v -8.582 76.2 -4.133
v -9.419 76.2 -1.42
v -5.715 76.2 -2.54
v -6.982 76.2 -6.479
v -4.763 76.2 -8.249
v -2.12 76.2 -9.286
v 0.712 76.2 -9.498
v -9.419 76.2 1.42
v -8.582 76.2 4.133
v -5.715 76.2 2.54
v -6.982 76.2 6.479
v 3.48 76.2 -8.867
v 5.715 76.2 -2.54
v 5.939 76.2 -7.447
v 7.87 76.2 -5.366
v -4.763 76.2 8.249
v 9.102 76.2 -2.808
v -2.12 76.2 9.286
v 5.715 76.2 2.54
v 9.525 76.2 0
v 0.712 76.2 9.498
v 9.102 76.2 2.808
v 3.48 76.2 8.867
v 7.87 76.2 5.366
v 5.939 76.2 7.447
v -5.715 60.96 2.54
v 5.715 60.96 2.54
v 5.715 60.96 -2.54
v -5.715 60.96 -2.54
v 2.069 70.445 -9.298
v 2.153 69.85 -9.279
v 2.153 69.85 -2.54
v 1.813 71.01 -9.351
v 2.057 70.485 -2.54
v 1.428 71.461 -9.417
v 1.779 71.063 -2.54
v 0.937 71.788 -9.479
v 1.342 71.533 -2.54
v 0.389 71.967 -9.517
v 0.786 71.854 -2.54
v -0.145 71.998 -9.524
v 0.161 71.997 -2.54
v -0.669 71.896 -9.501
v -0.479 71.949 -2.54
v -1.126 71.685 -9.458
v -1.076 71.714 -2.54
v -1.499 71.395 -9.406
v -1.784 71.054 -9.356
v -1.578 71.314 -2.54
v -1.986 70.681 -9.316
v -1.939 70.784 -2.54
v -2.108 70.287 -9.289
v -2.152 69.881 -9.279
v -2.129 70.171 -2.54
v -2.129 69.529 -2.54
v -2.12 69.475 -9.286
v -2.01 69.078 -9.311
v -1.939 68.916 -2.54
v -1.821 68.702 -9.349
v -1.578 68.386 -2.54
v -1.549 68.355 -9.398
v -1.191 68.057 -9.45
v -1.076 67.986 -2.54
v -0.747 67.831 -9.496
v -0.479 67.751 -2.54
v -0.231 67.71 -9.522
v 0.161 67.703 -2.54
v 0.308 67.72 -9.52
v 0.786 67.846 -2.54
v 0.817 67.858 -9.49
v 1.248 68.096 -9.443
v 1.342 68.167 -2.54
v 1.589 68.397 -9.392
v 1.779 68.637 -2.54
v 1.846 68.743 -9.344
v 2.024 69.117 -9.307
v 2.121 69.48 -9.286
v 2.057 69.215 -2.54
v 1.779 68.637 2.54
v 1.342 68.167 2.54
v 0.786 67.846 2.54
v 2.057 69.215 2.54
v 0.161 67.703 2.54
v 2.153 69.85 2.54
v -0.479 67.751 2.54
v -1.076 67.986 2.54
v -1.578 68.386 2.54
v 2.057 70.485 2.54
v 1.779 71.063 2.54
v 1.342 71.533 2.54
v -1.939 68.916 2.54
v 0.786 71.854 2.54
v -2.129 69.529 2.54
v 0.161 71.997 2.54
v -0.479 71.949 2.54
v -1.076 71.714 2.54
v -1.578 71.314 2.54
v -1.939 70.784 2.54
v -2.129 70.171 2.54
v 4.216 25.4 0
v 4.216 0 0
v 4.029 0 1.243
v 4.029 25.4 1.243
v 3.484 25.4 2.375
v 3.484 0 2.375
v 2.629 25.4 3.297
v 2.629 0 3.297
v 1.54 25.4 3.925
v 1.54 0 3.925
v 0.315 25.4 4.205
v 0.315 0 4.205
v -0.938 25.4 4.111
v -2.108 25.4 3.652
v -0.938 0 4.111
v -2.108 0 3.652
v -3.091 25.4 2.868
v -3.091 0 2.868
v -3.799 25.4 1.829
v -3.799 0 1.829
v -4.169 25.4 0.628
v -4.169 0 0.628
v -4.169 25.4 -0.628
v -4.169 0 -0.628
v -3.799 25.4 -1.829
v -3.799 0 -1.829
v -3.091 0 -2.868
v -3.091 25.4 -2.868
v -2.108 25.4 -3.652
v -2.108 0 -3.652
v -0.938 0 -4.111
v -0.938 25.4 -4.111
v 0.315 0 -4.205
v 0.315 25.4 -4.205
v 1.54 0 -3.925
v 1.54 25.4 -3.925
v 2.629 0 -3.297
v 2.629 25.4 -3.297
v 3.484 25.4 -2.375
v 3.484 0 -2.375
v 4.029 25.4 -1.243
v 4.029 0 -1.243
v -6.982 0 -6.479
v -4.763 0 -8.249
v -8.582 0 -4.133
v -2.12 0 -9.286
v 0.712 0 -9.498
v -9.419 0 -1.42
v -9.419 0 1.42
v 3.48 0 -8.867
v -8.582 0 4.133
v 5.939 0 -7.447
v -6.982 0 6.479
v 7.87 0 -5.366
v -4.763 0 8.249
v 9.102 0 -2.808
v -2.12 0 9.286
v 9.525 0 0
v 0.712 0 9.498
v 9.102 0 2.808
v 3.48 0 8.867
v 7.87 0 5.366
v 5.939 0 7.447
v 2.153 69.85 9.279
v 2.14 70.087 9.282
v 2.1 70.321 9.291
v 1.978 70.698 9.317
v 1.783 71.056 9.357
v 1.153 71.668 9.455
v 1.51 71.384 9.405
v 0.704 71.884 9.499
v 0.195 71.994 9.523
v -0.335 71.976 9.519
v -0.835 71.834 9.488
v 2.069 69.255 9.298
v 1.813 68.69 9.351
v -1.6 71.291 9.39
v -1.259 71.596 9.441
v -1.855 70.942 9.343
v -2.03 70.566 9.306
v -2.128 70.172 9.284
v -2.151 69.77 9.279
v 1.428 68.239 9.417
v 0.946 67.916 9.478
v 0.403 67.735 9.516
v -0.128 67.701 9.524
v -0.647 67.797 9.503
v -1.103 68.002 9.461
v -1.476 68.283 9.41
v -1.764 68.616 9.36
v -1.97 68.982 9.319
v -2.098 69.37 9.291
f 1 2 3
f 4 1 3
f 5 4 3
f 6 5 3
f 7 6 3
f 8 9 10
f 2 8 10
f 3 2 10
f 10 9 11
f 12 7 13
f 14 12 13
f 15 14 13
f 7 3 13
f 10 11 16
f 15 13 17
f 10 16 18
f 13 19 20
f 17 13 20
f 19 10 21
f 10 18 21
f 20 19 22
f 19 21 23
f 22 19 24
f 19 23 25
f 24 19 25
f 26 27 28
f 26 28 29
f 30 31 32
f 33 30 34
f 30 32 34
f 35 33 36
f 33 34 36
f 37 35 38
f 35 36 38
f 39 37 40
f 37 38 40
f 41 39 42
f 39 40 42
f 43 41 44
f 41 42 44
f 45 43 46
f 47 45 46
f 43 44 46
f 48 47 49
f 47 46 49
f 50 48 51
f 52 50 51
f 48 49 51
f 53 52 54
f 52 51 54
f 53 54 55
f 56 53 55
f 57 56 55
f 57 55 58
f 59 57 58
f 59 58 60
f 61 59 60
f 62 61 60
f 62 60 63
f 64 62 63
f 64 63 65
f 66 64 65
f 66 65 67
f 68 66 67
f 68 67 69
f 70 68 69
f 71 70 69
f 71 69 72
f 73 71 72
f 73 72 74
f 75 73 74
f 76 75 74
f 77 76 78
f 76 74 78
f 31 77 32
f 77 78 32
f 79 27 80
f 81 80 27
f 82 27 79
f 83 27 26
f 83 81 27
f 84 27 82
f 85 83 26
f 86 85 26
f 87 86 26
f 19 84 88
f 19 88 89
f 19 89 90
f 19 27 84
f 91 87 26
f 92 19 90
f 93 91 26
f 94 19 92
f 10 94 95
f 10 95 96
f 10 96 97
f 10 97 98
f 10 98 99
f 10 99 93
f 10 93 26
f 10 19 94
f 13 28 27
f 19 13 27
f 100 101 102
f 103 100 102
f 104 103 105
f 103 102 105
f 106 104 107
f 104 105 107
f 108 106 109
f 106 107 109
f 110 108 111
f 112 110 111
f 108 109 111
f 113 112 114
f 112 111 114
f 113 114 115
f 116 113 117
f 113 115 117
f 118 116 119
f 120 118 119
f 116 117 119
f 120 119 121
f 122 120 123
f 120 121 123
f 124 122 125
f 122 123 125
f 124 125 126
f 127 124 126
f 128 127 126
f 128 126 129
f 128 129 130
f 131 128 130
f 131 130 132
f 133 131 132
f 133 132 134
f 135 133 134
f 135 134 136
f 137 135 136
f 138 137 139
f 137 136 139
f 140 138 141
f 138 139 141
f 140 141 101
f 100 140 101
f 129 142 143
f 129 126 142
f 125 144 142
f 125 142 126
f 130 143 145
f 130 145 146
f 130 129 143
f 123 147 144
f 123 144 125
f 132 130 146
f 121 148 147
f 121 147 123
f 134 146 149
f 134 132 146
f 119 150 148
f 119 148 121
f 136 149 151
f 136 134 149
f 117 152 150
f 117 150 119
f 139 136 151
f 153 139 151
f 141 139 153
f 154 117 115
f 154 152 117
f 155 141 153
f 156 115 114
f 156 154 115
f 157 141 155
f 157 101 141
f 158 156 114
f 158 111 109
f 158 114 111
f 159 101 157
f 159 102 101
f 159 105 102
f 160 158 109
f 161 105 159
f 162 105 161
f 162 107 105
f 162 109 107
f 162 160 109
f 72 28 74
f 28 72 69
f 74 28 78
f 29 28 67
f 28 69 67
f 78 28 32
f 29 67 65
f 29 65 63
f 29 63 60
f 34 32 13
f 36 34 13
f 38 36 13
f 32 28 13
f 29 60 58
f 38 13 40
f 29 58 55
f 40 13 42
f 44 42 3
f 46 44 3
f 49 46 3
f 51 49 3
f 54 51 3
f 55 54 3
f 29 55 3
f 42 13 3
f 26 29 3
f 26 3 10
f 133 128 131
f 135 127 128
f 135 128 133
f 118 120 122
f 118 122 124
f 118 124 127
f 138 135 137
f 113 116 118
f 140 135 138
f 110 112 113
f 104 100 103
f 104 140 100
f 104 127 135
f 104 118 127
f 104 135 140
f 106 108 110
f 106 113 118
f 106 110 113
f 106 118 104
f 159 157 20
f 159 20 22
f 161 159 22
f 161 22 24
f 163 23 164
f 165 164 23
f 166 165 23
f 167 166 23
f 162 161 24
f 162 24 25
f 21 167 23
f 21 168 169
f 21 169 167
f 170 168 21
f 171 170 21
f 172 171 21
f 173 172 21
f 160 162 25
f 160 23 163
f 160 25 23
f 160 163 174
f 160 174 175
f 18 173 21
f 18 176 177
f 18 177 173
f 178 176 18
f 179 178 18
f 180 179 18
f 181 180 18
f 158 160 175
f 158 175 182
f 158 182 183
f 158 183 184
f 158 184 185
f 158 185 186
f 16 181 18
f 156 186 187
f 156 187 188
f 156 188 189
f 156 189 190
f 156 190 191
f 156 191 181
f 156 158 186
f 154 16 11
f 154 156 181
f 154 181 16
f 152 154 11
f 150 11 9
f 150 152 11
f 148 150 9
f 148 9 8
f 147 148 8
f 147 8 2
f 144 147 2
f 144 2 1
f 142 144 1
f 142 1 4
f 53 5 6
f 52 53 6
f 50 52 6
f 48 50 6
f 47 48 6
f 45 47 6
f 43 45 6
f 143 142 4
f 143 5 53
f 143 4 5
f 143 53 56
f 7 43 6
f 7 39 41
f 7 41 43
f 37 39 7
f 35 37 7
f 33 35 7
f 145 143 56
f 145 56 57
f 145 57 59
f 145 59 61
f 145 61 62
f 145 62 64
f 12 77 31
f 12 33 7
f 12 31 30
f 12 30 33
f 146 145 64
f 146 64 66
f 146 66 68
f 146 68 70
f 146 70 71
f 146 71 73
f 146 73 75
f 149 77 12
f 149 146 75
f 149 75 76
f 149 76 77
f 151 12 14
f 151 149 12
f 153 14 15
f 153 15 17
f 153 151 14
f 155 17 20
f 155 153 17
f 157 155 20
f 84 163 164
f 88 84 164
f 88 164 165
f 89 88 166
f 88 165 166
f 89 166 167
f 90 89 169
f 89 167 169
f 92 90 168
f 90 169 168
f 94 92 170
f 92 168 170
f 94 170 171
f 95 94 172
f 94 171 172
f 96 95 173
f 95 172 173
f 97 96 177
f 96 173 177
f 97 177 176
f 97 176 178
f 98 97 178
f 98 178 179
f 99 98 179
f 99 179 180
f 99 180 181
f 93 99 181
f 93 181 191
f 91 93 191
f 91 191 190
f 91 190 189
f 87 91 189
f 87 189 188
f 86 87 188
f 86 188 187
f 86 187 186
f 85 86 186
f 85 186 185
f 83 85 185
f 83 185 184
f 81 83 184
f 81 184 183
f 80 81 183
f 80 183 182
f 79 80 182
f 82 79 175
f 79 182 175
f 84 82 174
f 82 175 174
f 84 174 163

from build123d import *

# Parameters (mm, degrees)
F0_R     = 9.525
F1_DEPTH = 76.2
F2_W     = 11.43
F2_H     = 5.08
F3_DEPTH = 15.24
F5_R     = 2.15265
F6_DEPTH = 25.4
F7_R     = 4.2164
F8_DEPTH = 25.4


with BuildPart() as f1:
    # F0 (on Front) → F1 (new body)
    with BuildSketch(Plane.XZ):
        Circle(F0_R)
    extrude(amount=-F1_DEPTH)

    # F2 (on face) → F3 (cut)
    with BuildSketch(Plane(origin=(0, 76.2, 0), x_dir=(-1, 0, 0), z_dir=(0, 1, 0))):
        Rectangle(F2_W, F2_H)
    extrude(amount=-F3_DEPTH, mode=Mode.SUBTRACT)

    # F5 (on offset) → F6 (cut)
    with BuildSketch(Plane.XY.offset(9.525)):
        with Locations((0, 69.85)):
            Circle(F5_R)
    extrude(amount=-F6_DEPTH, mode=Mode.SUBTRACT)

    # F7 (on face) → F8 (cut)
    with BuildSketch(Plane.XZ):
        Circle(F7_R)
    extrude(amount=-F8_DEPTH, mode=Mode.SUBTRACT)


solid = f1.part
